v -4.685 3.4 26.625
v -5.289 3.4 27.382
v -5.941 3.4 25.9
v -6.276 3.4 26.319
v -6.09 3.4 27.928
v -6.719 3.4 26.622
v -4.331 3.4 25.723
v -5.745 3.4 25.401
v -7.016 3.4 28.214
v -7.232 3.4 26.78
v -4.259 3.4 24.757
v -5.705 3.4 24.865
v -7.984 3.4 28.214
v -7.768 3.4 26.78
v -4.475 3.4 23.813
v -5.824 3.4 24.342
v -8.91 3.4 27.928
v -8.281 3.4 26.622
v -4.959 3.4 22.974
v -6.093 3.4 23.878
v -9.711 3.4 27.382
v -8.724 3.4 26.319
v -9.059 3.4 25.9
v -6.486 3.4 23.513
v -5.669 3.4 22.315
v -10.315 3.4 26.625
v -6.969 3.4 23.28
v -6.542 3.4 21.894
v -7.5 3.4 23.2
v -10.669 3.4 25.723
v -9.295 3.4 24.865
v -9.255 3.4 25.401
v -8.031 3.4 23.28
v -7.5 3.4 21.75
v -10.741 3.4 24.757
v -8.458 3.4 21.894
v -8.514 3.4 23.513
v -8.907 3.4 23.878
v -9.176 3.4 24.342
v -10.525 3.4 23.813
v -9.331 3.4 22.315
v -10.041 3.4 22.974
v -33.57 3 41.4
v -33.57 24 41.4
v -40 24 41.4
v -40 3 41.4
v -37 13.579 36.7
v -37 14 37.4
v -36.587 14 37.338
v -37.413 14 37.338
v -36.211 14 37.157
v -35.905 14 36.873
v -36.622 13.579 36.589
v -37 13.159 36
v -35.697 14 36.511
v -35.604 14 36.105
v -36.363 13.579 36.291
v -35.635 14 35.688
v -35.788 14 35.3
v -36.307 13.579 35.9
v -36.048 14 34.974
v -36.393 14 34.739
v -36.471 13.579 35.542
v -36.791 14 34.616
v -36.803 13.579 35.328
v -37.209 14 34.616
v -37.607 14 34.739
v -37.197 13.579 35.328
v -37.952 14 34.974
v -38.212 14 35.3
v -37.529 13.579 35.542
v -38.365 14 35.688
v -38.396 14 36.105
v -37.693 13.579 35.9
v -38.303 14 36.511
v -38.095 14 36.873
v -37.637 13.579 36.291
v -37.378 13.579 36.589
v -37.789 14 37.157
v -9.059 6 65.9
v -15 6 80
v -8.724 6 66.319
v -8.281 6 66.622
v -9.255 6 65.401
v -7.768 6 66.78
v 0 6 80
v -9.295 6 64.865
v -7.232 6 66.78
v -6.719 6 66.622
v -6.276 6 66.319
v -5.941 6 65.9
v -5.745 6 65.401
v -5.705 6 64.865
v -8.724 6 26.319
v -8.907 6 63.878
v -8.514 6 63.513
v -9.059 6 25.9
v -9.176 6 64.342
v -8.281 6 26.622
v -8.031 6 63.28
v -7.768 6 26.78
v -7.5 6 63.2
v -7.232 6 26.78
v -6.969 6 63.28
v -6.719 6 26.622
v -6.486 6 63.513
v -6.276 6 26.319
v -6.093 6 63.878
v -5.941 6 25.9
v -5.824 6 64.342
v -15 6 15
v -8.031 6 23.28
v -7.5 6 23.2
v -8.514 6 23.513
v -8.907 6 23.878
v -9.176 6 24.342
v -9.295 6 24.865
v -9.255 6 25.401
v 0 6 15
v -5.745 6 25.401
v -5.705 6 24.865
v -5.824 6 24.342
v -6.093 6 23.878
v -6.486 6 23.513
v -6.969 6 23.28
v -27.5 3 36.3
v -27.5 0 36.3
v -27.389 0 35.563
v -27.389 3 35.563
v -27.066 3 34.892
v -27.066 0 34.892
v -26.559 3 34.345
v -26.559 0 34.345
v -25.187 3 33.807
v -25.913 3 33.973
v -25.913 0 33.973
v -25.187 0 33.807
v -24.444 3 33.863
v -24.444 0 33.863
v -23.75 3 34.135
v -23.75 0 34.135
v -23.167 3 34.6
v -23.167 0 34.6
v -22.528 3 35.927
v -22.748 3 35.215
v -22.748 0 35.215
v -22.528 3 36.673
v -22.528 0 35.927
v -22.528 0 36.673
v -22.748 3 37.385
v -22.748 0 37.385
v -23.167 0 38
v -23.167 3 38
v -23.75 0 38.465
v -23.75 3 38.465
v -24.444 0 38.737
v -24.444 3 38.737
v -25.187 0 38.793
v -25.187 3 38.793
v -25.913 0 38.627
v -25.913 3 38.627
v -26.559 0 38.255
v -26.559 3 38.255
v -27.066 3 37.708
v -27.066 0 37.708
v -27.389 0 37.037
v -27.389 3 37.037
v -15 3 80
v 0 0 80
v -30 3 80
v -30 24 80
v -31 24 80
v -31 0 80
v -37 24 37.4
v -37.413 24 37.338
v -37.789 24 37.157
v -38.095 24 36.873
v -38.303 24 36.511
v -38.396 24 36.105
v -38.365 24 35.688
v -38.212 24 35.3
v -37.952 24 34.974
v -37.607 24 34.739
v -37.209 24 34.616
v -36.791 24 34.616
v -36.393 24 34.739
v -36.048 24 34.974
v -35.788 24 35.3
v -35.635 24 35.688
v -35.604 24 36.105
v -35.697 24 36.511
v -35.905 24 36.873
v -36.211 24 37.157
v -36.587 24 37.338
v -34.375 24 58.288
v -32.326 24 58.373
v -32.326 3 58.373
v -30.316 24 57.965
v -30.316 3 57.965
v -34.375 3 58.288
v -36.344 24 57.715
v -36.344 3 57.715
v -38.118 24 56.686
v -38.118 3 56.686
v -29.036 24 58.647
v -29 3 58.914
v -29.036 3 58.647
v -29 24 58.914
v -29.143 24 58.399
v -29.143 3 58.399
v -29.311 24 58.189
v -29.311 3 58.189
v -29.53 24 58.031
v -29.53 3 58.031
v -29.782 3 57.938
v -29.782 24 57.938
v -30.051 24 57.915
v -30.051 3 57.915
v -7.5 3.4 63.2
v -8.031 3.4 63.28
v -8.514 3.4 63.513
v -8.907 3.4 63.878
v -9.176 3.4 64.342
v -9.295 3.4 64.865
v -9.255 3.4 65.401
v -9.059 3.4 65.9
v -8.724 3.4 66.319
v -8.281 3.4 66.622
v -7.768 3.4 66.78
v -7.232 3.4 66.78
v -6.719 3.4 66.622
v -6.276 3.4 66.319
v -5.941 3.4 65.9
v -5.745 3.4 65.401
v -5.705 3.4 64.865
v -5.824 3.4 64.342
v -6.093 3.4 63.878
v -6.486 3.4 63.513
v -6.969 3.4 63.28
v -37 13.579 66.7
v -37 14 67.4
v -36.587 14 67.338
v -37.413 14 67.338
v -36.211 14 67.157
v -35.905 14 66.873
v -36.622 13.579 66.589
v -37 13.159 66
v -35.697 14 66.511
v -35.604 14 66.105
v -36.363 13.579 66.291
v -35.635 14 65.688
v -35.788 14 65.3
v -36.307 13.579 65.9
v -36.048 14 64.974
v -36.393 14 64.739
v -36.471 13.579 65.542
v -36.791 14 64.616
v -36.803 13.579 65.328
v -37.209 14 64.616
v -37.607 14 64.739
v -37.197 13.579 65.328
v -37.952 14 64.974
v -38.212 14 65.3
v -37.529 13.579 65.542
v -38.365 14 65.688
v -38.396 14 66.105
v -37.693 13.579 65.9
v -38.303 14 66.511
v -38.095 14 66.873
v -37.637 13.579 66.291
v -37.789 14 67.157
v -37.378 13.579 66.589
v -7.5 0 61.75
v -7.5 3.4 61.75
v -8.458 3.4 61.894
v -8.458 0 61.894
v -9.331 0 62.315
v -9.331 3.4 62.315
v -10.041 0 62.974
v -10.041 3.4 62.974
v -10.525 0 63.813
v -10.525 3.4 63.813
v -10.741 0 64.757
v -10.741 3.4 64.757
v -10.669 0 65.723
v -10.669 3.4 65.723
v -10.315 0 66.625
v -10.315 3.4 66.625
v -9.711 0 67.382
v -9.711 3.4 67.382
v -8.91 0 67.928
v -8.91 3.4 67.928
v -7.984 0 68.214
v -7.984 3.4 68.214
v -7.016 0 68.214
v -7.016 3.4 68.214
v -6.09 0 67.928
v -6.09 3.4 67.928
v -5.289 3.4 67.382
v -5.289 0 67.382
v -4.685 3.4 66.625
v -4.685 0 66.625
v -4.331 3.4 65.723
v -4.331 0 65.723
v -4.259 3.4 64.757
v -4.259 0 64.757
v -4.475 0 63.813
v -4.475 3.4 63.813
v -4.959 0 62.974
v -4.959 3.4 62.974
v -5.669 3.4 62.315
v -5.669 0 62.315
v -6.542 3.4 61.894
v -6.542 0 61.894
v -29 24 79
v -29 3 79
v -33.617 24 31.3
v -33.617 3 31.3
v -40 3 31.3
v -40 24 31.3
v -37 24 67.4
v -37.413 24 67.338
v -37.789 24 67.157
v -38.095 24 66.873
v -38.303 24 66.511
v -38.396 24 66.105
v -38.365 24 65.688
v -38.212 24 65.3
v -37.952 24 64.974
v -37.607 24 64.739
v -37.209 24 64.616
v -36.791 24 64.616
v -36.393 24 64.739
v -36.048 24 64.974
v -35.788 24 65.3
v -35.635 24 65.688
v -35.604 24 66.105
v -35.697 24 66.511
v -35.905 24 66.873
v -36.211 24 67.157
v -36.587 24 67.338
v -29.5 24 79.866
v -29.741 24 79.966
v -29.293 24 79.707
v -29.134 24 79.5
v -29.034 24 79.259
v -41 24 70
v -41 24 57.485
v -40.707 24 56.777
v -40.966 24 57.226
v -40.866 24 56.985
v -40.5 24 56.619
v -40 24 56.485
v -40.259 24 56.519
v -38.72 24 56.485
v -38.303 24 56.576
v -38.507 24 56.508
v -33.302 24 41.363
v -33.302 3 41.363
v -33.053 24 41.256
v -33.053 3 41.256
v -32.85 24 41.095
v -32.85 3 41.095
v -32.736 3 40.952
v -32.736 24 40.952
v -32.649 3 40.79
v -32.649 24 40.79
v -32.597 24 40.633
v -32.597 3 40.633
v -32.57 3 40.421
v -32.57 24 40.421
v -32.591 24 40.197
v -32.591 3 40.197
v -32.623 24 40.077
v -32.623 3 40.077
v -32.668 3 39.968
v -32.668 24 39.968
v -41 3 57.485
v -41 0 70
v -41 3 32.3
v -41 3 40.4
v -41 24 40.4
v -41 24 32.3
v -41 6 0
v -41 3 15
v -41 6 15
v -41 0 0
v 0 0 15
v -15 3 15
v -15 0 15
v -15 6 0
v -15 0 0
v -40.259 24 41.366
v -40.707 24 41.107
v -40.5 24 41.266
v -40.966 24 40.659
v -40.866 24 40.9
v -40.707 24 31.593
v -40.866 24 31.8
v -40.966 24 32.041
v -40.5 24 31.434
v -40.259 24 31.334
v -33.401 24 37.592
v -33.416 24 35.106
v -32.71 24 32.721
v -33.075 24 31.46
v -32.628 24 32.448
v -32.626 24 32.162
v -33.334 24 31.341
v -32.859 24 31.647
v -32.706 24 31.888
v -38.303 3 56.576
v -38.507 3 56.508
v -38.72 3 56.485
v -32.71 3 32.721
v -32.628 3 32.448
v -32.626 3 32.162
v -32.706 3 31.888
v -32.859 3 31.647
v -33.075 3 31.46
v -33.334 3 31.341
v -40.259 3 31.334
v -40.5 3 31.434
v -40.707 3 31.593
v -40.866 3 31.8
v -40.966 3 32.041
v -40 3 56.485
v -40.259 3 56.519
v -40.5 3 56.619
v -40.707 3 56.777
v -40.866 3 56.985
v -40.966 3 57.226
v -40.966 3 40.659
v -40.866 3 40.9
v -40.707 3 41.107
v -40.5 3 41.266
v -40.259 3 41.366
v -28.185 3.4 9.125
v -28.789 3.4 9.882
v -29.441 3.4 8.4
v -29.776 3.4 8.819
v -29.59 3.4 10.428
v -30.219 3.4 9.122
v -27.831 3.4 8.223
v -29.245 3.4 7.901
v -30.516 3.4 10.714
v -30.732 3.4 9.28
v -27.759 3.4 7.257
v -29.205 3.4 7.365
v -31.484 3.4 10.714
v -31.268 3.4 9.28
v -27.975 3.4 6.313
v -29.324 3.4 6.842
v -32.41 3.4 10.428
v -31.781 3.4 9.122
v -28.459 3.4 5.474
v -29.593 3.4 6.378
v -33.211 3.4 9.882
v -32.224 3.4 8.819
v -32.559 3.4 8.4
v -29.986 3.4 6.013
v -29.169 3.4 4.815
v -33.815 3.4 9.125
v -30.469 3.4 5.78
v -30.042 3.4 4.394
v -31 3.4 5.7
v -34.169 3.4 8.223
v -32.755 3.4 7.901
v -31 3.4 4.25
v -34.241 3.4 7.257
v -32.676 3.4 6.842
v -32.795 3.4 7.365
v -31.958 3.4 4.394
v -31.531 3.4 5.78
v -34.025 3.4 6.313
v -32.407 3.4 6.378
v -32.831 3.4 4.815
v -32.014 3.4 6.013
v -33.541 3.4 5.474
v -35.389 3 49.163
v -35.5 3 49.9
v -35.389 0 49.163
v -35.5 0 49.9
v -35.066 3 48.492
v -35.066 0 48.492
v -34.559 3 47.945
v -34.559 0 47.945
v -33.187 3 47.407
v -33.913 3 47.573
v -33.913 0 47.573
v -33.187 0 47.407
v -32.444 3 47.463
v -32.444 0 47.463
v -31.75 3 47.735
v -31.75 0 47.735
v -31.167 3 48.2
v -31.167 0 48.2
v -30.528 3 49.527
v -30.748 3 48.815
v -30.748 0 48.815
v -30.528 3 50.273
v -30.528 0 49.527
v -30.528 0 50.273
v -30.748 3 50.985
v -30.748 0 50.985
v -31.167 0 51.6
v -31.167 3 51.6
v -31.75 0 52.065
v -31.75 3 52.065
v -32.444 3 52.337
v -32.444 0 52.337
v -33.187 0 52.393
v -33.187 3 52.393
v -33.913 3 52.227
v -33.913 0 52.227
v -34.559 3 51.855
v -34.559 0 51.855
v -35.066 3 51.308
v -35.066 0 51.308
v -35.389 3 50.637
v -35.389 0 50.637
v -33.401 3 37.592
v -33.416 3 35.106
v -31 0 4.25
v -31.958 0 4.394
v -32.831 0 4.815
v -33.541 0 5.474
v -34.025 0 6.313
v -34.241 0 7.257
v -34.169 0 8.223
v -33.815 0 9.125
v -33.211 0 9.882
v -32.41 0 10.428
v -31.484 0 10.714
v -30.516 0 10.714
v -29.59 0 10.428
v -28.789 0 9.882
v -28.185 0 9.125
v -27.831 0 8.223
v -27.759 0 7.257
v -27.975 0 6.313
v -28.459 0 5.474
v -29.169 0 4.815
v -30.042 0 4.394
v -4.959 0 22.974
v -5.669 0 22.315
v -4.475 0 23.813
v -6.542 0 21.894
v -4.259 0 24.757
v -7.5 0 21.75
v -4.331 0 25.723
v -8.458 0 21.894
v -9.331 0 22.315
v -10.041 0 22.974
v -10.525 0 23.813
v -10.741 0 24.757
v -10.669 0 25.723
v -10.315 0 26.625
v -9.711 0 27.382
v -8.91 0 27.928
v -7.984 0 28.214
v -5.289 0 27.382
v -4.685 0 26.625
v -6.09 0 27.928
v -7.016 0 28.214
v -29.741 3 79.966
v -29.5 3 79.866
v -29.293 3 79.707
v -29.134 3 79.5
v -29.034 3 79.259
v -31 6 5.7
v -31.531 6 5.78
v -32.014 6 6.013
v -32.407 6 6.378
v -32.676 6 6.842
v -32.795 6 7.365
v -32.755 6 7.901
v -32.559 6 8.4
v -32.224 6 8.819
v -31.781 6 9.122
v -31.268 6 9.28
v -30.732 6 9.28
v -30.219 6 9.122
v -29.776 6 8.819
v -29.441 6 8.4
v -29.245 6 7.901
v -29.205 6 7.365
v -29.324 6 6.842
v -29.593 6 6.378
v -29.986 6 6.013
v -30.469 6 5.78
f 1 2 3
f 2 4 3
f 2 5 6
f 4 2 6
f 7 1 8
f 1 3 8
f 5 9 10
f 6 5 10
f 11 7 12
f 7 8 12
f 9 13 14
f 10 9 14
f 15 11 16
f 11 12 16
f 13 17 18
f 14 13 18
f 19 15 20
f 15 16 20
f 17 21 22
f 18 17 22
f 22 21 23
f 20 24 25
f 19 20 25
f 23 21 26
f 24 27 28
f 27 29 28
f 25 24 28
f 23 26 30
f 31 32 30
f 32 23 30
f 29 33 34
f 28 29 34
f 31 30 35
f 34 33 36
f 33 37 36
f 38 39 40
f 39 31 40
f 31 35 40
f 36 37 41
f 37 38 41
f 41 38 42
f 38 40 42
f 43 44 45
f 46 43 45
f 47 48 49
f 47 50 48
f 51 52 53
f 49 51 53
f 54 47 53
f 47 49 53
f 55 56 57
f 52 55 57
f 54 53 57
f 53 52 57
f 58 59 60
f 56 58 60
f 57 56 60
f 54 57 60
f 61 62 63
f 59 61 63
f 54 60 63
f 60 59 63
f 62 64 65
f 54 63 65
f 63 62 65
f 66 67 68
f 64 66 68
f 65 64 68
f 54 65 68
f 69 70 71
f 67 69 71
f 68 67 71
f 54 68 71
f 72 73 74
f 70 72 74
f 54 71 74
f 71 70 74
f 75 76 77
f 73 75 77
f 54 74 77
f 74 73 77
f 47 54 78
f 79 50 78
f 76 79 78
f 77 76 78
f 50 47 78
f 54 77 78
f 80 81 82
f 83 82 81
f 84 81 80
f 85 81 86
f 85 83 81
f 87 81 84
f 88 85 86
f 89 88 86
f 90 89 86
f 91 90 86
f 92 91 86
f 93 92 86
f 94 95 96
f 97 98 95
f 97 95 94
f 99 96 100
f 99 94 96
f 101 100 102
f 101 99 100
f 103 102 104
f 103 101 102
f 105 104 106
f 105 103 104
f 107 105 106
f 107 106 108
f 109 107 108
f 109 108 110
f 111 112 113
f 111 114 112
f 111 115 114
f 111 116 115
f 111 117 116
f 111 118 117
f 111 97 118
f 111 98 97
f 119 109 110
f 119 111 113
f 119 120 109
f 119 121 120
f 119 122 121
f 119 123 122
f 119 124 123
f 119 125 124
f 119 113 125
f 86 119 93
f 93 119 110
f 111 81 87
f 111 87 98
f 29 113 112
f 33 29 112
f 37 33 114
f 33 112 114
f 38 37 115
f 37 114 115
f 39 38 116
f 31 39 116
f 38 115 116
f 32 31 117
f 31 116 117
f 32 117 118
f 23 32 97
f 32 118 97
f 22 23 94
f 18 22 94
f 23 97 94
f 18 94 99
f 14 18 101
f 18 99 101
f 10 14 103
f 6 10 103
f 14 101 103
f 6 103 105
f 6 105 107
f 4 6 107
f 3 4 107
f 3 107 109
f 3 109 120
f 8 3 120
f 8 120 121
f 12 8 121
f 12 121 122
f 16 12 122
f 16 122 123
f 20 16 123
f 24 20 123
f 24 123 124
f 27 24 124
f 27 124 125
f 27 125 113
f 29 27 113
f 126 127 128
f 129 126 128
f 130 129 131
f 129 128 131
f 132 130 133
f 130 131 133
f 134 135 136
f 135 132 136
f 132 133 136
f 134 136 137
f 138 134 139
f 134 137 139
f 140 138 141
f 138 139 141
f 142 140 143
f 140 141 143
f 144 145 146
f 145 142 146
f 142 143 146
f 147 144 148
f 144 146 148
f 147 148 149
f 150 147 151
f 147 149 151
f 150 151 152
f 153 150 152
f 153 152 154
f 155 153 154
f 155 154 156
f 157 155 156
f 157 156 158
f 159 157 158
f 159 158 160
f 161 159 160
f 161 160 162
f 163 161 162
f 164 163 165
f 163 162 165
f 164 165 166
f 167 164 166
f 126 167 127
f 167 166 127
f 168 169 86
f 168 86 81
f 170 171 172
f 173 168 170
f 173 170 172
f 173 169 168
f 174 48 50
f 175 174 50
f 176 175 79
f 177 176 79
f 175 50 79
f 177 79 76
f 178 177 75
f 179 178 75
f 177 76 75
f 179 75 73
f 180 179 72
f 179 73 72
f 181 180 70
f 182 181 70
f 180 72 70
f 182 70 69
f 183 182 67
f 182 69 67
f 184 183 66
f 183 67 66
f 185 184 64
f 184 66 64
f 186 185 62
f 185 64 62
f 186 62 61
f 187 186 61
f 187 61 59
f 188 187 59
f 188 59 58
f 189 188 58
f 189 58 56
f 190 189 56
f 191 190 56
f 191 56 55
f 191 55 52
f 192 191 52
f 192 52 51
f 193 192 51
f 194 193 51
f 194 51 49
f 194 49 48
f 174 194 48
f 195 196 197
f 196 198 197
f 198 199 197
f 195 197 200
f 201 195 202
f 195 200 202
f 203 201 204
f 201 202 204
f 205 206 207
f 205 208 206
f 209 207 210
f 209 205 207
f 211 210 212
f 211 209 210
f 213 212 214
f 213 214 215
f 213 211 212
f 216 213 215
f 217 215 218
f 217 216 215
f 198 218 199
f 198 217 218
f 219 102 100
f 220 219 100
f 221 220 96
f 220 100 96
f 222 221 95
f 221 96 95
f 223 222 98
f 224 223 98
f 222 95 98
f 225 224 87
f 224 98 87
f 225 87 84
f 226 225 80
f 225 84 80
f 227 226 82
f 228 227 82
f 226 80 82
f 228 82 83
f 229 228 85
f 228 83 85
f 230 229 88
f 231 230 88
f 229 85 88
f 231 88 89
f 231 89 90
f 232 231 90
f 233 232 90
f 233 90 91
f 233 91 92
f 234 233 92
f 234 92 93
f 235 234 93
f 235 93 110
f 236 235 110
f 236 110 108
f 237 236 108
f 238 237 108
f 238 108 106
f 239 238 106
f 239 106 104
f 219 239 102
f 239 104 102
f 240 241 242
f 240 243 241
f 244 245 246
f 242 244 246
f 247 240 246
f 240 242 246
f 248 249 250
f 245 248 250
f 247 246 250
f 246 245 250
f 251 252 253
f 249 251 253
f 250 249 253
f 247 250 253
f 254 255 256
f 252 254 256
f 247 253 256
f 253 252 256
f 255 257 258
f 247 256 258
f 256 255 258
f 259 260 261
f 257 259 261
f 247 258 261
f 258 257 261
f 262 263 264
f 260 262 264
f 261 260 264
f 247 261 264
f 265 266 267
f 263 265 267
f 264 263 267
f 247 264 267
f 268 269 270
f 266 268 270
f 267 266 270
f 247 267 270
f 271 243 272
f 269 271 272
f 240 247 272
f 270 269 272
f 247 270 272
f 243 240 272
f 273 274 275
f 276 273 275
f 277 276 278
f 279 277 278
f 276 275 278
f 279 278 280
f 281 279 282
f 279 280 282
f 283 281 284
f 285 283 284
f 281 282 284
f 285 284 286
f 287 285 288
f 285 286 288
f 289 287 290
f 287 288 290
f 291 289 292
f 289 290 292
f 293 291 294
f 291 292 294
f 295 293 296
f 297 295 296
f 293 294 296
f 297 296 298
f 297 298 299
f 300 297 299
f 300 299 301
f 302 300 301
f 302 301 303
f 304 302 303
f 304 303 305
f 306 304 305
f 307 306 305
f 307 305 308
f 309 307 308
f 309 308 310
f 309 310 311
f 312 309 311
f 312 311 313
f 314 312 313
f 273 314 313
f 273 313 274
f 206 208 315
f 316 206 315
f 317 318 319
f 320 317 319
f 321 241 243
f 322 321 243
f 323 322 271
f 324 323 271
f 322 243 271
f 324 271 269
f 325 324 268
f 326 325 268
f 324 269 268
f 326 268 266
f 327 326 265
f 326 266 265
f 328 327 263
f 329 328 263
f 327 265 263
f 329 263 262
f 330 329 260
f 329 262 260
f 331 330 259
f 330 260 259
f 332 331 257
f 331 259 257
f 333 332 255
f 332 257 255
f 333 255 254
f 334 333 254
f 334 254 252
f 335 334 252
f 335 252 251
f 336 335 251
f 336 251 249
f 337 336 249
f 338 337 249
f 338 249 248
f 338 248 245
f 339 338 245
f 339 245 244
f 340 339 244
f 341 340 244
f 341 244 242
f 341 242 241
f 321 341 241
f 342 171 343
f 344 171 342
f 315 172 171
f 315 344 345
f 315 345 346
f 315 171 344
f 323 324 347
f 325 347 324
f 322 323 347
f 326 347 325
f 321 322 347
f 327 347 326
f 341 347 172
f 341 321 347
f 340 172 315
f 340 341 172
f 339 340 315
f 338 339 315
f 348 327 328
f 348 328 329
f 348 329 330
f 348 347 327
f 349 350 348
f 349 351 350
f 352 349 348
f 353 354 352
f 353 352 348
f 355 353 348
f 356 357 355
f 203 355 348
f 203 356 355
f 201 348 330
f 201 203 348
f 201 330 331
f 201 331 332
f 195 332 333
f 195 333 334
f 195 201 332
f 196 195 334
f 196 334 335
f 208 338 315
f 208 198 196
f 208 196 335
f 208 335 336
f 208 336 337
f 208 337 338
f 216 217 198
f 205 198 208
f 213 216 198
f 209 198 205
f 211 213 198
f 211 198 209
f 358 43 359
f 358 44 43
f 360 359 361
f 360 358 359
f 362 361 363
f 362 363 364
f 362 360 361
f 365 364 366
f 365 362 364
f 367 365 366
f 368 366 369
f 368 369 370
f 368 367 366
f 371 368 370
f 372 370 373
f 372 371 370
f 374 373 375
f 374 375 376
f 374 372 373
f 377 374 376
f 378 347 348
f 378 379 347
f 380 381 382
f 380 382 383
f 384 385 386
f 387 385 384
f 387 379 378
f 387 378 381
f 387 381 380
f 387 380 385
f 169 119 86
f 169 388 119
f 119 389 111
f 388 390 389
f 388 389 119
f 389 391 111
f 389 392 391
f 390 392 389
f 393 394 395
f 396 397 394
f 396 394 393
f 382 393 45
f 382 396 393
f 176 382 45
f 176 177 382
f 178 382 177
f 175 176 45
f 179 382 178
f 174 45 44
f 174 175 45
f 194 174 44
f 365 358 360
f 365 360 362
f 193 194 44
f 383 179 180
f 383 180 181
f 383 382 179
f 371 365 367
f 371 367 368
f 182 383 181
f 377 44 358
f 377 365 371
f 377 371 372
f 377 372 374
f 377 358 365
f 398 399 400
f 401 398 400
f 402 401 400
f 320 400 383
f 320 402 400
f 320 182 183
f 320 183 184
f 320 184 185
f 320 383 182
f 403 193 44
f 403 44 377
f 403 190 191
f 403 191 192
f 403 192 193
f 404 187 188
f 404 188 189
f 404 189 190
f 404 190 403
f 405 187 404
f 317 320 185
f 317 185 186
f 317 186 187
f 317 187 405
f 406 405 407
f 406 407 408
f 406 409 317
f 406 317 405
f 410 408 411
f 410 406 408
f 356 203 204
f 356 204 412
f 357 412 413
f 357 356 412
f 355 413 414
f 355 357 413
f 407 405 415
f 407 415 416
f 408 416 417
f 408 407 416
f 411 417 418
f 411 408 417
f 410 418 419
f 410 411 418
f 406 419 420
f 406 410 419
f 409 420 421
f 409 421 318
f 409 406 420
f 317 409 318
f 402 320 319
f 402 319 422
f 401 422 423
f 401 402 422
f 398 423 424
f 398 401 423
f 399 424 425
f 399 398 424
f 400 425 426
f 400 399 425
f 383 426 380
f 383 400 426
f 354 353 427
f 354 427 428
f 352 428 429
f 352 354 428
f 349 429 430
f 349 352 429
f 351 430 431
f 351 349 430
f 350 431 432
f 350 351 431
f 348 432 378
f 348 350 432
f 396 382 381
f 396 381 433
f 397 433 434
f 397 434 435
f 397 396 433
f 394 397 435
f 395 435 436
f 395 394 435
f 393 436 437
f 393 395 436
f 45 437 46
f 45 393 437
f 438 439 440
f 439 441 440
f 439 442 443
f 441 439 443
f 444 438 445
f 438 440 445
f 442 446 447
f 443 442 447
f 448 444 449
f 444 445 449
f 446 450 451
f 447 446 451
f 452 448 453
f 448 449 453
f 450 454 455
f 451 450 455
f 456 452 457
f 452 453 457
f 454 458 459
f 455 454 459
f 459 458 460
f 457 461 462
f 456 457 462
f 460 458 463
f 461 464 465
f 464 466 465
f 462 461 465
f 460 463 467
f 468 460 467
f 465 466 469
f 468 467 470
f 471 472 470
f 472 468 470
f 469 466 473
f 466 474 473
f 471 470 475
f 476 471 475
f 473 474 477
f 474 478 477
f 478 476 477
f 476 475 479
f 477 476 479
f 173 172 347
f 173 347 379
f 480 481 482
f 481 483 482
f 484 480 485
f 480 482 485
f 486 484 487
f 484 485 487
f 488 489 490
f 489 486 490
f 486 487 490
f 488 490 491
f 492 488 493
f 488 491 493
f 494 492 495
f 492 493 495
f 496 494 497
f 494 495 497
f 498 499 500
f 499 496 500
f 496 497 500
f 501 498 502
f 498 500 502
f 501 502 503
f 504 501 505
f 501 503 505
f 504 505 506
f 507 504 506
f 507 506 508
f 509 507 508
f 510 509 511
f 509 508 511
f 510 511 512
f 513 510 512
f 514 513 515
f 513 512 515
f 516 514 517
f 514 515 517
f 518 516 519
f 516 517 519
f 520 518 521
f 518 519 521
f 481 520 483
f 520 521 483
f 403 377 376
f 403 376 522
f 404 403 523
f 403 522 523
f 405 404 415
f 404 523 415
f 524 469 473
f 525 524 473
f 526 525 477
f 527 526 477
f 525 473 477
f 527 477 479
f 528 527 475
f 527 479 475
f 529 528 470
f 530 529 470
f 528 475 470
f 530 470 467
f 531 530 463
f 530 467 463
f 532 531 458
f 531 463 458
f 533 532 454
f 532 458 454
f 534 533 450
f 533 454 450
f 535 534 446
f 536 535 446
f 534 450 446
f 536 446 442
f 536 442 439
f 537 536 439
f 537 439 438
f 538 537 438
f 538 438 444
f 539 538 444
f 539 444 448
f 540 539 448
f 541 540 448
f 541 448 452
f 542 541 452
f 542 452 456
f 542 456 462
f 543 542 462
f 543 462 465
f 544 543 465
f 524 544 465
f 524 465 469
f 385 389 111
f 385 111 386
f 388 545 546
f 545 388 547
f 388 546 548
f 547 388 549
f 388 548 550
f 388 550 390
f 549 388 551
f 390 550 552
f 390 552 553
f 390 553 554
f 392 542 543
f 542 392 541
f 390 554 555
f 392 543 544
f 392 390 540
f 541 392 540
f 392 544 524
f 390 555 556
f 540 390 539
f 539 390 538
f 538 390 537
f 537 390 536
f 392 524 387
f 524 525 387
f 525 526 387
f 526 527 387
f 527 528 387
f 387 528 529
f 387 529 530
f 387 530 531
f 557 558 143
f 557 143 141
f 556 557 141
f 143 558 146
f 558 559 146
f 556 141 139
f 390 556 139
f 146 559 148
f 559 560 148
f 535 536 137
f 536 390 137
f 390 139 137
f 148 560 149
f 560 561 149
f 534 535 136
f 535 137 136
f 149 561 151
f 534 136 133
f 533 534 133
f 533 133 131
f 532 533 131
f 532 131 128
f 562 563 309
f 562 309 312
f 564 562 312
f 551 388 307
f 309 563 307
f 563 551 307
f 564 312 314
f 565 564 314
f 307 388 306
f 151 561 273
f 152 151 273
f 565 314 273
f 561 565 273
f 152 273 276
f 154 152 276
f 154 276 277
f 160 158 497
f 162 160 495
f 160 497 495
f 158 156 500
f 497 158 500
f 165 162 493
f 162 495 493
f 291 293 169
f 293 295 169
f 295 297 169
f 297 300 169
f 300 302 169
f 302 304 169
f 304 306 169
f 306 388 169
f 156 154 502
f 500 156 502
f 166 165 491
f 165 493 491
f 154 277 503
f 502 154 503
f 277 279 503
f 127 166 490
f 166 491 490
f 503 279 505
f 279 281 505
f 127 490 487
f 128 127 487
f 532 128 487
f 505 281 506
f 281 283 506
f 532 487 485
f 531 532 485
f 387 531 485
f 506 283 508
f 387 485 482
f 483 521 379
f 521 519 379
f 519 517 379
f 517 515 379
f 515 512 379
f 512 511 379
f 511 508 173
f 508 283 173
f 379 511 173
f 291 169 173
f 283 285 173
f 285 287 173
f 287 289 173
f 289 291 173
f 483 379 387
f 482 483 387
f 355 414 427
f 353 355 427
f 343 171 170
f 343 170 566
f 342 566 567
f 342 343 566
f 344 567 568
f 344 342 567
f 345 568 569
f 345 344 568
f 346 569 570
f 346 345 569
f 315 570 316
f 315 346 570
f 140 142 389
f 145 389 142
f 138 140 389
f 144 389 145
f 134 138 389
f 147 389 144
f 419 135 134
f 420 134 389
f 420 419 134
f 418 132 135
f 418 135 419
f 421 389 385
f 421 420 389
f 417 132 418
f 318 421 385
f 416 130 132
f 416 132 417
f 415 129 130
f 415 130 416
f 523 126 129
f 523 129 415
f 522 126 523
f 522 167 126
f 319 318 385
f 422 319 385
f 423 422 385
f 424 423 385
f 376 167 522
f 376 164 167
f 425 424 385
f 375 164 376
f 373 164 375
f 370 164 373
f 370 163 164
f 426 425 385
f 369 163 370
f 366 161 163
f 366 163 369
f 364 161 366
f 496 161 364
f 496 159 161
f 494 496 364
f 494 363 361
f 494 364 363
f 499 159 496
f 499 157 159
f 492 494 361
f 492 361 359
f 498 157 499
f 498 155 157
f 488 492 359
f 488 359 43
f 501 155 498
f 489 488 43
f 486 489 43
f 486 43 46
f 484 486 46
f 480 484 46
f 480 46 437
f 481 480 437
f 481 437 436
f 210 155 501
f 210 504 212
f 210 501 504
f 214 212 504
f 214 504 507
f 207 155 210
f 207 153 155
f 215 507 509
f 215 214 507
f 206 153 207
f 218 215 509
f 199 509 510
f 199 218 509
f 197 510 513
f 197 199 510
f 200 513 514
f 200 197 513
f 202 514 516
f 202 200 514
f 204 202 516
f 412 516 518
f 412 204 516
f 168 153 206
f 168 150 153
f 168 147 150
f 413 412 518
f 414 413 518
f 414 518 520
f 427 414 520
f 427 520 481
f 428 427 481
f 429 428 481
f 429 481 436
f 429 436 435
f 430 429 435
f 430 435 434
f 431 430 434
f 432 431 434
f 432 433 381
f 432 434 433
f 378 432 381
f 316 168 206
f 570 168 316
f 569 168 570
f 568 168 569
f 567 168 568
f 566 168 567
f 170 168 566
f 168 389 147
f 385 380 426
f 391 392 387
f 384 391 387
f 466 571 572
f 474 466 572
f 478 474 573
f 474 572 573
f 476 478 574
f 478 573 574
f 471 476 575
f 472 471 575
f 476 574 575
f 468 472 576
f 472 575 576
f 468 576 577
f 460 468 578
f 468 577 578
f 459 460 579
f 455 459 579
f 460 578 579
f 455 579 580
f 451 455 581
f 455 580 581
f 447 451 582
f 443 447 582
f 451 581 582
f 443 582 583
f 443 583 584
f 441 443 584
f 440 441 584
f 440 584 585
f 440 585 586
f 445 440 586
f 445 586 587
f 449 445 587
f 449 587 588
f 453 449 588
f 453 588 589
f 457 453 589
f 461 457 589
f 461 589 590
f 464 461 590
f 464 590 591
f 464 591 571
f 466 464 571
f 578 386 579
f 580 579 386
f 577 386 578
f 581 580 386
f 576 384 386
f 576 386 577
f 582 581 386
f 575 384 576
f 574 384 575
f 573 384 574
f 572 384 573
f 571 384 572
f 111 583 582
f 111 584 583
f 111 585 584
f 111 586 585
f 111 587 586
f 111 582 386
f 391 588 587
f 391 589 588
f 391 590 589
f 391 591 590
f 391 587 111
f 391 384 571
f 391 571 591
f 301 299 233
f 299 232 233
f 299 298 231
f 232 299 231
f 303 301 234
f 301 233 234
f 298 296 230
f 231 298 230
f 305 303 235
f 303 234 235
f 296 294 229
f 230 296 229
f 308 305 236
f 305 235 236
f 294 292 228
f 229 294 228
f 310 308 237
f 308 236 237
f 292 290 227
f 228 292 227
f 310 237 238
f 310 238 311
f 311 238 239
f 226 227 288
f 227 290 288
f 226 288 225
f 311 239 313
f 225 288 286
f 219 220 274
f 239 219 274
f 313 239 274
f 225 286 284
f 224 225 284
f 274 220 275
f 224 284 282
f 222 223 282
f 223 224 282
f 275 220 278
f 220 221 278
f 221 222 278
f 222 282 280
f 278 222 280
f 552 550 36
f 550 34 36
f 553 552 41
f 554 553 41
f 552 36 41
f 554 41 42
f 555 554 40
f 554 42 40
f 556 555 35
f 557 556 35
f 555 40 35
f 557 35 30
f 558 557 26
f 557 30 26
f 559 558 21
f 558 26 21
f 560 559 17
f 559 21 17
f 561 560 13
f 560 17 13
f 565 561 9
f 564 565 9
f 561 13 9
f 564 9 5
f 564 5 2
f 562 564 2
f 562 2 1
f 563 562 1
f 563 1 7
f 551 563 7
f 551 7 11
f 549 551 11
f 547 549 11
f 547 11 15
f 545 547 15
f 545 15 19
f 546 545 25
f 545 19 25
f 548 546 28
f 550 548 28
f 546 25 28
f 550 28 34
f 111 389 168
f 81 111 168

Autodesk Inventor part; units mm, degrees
ref_plane "YZ Plane" through (0, 0, 0) normal (1, 0, 0) x (0, 1, 0)
ref_plane "XZ Plane" through (0, 0, 0) normal (0, 1, 0) x (-1, 0, 0)
ref_plane "XY Plane" through (0, 0, 0) normal (0, 0, 1) x (1, 0, 0)
sketch "Sketch1" plane through (0, 0, 0) normal (0, 1, 0) x (-1, 0, 0)
  circle A0 centre (25, 36.3) radius 2.5
  circle A1 centre (33, 49.9) radius 2.5
  line L0 (15, 0) -> (15, 15)
  line L1 (15, 15) -> (0, 15)
  line L2 (0, 15) -> (0, 80)
  line L3 (0, 80) -> (41, 80)
  line L4 (41, 80) -> (41, 0)
  line L5 (15, 0) -> (41, 0)
  circle A2 centre (25, 36.3) radius 7.5 construction
  circle A3 centre (33, 49.9) radius 7.5 construction
  point P0 (0, 0)
  dimension "d0" = 5
  dimension "d1" = 15
  dimension "d2" = 25
  dimension "d3" = 21.3
  dimension "d4" = 8
  dimension "d5" = 13.6
  dimension "d12" = 15
  dimension "d46" = 80
  dimension "d47" = 41
extrude "Extrusion1" add sketch "Sketch1" along normal blind 3
sketch "Sketch2" plane through (0, 3, 0) normal (0, 1, 0) x (1, 0, 0)
  line L0 (-41, 0) -> (-41, -80) projected
  line L1 (-41, -80) -> (0, -80) projected
  line L2 (0, -80) -> (0, -15) projected
  line L3 (0, -15) -> (-15, -15) projected
  line L4 (-15, -15) -> (-15, 0) projected
  line L5 (-15, 0) -> (-41, 0) projected
  circle A0 centre (-33, -49.9) radius 2.5 projected
  circle A1 centre (-25, -36.3) radius 2.5 projected
  line L6 (-15, -15) -> (-15, 0) projected
  line L7 (-15, -15) -> (-15, -80)
  line L8 (-15, -15) -> (-41, -15)
  line L9 (-41, 0) -> (-41, -80) projected
  point P0 (0, 0)
extrude "Extrusion2" add sketch "Sketch2" along normal blind 3 contours L5 L4 L8 L0 | L3 L2 L1 L7
sketch "Sketch3" plane through (0, 3, 0) normal (0, 1, 0) x (1, 0, 0)
  circle A0 centre (-25, -36.3) radius 2.5 projected
  circle A1 centre (-33, -49.9) radius 2.5 projected
  line L0 (-15, -80) -> (-15, -15) projected
  line L1 (-15, -15) -> (-41, -15) projected
  line L2 (-41, -15) -> (-41, -80) projected
  line L3 (-41, -80) -> (-15, -80) projected
  circle A2 centre (-25, -36.3) radius 2.5 projected
  circle A3 centre (-25, -36.3) radius 8.5
  circle A4 centre (-33, -49.9) radius 2.5 projected
  circle A5 centre (-33, -49.9) radius 8.5
  line L4 (-31.8739, -31.3) -> (-41, -31.3)
  line L5 (-41, 0) -> (-41, -80) projected
  line L6 (-33, -41.4) -> (-41, -41.4)
  line L7 (-38.3753, -56.4846) -> (-41, -56.4846)
  line L8 (-29, -57.4) -> (-29, -80)
  line L9 (-41, -80) -> (0, -80) projected
  point P0 (0, 0)
  point P1 (-31.727, -41.4959)
  dimension "d15" = 17
  dimension "d16" = 5
  dimension "d19" = 12
extrude "Extrusion3" add sketch "Sketch3" along normal blind 21 contours L3 L2 L7 A5 L8 | L4 A3 A5 L6 L2
fillet "Fillet1" radius 1 8 edges at (-31.8739, 13.5, 31.3) (-31.727, 13.5, 41.4959) (-41, 13.5, 41.4) (-41, 13.5, 31.3) (-41, 13.5, 56.4846) (-29, 13.5, 57.4) (-29, 13.5, 80) (-38.3753, 13.5, 56.4846)
chamfer "Chamfer1" distance 10 angle 45 1 edges at (-41, 12, 80)
sketch "Sketch4" plane through (0, 24, 0) normal (0, 1, 0) x (1, 0, 0)
  line L0 (-31, -80) -> (-41, -70) projected
  line L1 (-31, -80) -> (-30, -80) projected
  arc A0 (-30, -80) -> (-29, -79) centre (-30, -79) ccw projected
  line L2 (-29, -79) -> (-29, -58.9139) projected
  arc A1 (-29, -58.9139) -> (-30.3158, -57.965) centre (-30, -58.9139) ccw projected
  arc A2 (-38.1184, -56.6862) -> (-30.3158, -57.965) centre (-33, -49.9) ccw projected
  arc A3 (-38.1184, -56.6862) -> (-38.7205, -56.4846) centre (-38.7205, -57.4846) ccw projected
  line L3 (-38.7205, -56.4846) -> (-40, -56.4846) projected
  arc A4 (-40, -56.4846) -> (-41, -57.4846) centre (-40, -57.4846) ccw projected
  line L4 (-41, -57.4846) -> (-41, -70) projected
  arc A5 (-40, -31.3) -> (-41, -32.3) centre (-40, -32.3) ccw projected
  line L5 (-41, -32.3) -> (-41, -40.4) projected
  arc A6 (-41, -40.4) -> (-40, -41.4) centre (-40, -40.4) ccw projected
  line L6 (-40, -41.4) -> (-33.5697, -41.4) projected
  arc A7 (-33.5697, -41.4) -> (-32.6676, -39.9684) centre (-33.5697, -40.4) ccw projected
  arc A8 (-32.7098, -32.7211) -> (-32.6676, -39.9684) centre (-25, -36.3) ccw projected
  arc A9 (-32.7098, -32.7211) -> (-33.6168, -31.3) centre (-33.6168, -32.3) ccw projected
  line L7 (-33.6168, -31.3) -> (-40, -31.3) projected
  point P0 (0, 0)
  point P1 (-37, -36)
  point P2 (-37, -66)
  dimension "d24" = 4
  dimension "d25" = 36
  dimension "d26" = 30
hole "Hole1" at (-37, 24, 36) at (-37, 24, 66) direction (0, -1, 0) diameter 2.8 depth 10 tip angle 118
sketch "Sketch5" plane through (0, 0, 0) normal (0, -1, 0) x (1, 0, 0)
  line L0 (-41, 70) -> (-31, 80) projected
  line L1 (-41, 0) -> (-41, 70) projected
  line L2 (-15, 0) -> (-41, 0) projected
  line L3 (-15, 15) -> (-15, 0) projected
  line L4 (0, 15) -> (-15, 15) projected
  line L5 (0, 80) -> (0, 15) projected
  line L6 (-31, 80) -> (0, 80) projected
  circle A0 centre (-33, 49.9) radius 2.5 projected
  circle A1 centre (-25, 36.3) radius 2.5 projected
  point P0 (0, 0)
  point P1 (-31, 7.5)
  point P2 (-7.5, 25)
  point P3 (-7.5, 65)
  dimension "d34" = 7.5
  dimension "d35" = 7.5
  dimension "d36" = 10
  dimension "d37" = 15
  dimension "d38" = 40
hole "Hole2" at (-31, 0, 7.5) at (-7.5, 0, 25) at (-7.5, 0, 65) direction (0, 1, 0) diameter 3.6 end through all counterbore diameter 6.5 counterbore depth 3.4 clearance for "Socket Head Cap Screw ISO 4762" size "M3" standard "ISO"
equation "\"d35\" = d34"
properties part number "Alpha Idler Assembly" material "ABS Plastic"
